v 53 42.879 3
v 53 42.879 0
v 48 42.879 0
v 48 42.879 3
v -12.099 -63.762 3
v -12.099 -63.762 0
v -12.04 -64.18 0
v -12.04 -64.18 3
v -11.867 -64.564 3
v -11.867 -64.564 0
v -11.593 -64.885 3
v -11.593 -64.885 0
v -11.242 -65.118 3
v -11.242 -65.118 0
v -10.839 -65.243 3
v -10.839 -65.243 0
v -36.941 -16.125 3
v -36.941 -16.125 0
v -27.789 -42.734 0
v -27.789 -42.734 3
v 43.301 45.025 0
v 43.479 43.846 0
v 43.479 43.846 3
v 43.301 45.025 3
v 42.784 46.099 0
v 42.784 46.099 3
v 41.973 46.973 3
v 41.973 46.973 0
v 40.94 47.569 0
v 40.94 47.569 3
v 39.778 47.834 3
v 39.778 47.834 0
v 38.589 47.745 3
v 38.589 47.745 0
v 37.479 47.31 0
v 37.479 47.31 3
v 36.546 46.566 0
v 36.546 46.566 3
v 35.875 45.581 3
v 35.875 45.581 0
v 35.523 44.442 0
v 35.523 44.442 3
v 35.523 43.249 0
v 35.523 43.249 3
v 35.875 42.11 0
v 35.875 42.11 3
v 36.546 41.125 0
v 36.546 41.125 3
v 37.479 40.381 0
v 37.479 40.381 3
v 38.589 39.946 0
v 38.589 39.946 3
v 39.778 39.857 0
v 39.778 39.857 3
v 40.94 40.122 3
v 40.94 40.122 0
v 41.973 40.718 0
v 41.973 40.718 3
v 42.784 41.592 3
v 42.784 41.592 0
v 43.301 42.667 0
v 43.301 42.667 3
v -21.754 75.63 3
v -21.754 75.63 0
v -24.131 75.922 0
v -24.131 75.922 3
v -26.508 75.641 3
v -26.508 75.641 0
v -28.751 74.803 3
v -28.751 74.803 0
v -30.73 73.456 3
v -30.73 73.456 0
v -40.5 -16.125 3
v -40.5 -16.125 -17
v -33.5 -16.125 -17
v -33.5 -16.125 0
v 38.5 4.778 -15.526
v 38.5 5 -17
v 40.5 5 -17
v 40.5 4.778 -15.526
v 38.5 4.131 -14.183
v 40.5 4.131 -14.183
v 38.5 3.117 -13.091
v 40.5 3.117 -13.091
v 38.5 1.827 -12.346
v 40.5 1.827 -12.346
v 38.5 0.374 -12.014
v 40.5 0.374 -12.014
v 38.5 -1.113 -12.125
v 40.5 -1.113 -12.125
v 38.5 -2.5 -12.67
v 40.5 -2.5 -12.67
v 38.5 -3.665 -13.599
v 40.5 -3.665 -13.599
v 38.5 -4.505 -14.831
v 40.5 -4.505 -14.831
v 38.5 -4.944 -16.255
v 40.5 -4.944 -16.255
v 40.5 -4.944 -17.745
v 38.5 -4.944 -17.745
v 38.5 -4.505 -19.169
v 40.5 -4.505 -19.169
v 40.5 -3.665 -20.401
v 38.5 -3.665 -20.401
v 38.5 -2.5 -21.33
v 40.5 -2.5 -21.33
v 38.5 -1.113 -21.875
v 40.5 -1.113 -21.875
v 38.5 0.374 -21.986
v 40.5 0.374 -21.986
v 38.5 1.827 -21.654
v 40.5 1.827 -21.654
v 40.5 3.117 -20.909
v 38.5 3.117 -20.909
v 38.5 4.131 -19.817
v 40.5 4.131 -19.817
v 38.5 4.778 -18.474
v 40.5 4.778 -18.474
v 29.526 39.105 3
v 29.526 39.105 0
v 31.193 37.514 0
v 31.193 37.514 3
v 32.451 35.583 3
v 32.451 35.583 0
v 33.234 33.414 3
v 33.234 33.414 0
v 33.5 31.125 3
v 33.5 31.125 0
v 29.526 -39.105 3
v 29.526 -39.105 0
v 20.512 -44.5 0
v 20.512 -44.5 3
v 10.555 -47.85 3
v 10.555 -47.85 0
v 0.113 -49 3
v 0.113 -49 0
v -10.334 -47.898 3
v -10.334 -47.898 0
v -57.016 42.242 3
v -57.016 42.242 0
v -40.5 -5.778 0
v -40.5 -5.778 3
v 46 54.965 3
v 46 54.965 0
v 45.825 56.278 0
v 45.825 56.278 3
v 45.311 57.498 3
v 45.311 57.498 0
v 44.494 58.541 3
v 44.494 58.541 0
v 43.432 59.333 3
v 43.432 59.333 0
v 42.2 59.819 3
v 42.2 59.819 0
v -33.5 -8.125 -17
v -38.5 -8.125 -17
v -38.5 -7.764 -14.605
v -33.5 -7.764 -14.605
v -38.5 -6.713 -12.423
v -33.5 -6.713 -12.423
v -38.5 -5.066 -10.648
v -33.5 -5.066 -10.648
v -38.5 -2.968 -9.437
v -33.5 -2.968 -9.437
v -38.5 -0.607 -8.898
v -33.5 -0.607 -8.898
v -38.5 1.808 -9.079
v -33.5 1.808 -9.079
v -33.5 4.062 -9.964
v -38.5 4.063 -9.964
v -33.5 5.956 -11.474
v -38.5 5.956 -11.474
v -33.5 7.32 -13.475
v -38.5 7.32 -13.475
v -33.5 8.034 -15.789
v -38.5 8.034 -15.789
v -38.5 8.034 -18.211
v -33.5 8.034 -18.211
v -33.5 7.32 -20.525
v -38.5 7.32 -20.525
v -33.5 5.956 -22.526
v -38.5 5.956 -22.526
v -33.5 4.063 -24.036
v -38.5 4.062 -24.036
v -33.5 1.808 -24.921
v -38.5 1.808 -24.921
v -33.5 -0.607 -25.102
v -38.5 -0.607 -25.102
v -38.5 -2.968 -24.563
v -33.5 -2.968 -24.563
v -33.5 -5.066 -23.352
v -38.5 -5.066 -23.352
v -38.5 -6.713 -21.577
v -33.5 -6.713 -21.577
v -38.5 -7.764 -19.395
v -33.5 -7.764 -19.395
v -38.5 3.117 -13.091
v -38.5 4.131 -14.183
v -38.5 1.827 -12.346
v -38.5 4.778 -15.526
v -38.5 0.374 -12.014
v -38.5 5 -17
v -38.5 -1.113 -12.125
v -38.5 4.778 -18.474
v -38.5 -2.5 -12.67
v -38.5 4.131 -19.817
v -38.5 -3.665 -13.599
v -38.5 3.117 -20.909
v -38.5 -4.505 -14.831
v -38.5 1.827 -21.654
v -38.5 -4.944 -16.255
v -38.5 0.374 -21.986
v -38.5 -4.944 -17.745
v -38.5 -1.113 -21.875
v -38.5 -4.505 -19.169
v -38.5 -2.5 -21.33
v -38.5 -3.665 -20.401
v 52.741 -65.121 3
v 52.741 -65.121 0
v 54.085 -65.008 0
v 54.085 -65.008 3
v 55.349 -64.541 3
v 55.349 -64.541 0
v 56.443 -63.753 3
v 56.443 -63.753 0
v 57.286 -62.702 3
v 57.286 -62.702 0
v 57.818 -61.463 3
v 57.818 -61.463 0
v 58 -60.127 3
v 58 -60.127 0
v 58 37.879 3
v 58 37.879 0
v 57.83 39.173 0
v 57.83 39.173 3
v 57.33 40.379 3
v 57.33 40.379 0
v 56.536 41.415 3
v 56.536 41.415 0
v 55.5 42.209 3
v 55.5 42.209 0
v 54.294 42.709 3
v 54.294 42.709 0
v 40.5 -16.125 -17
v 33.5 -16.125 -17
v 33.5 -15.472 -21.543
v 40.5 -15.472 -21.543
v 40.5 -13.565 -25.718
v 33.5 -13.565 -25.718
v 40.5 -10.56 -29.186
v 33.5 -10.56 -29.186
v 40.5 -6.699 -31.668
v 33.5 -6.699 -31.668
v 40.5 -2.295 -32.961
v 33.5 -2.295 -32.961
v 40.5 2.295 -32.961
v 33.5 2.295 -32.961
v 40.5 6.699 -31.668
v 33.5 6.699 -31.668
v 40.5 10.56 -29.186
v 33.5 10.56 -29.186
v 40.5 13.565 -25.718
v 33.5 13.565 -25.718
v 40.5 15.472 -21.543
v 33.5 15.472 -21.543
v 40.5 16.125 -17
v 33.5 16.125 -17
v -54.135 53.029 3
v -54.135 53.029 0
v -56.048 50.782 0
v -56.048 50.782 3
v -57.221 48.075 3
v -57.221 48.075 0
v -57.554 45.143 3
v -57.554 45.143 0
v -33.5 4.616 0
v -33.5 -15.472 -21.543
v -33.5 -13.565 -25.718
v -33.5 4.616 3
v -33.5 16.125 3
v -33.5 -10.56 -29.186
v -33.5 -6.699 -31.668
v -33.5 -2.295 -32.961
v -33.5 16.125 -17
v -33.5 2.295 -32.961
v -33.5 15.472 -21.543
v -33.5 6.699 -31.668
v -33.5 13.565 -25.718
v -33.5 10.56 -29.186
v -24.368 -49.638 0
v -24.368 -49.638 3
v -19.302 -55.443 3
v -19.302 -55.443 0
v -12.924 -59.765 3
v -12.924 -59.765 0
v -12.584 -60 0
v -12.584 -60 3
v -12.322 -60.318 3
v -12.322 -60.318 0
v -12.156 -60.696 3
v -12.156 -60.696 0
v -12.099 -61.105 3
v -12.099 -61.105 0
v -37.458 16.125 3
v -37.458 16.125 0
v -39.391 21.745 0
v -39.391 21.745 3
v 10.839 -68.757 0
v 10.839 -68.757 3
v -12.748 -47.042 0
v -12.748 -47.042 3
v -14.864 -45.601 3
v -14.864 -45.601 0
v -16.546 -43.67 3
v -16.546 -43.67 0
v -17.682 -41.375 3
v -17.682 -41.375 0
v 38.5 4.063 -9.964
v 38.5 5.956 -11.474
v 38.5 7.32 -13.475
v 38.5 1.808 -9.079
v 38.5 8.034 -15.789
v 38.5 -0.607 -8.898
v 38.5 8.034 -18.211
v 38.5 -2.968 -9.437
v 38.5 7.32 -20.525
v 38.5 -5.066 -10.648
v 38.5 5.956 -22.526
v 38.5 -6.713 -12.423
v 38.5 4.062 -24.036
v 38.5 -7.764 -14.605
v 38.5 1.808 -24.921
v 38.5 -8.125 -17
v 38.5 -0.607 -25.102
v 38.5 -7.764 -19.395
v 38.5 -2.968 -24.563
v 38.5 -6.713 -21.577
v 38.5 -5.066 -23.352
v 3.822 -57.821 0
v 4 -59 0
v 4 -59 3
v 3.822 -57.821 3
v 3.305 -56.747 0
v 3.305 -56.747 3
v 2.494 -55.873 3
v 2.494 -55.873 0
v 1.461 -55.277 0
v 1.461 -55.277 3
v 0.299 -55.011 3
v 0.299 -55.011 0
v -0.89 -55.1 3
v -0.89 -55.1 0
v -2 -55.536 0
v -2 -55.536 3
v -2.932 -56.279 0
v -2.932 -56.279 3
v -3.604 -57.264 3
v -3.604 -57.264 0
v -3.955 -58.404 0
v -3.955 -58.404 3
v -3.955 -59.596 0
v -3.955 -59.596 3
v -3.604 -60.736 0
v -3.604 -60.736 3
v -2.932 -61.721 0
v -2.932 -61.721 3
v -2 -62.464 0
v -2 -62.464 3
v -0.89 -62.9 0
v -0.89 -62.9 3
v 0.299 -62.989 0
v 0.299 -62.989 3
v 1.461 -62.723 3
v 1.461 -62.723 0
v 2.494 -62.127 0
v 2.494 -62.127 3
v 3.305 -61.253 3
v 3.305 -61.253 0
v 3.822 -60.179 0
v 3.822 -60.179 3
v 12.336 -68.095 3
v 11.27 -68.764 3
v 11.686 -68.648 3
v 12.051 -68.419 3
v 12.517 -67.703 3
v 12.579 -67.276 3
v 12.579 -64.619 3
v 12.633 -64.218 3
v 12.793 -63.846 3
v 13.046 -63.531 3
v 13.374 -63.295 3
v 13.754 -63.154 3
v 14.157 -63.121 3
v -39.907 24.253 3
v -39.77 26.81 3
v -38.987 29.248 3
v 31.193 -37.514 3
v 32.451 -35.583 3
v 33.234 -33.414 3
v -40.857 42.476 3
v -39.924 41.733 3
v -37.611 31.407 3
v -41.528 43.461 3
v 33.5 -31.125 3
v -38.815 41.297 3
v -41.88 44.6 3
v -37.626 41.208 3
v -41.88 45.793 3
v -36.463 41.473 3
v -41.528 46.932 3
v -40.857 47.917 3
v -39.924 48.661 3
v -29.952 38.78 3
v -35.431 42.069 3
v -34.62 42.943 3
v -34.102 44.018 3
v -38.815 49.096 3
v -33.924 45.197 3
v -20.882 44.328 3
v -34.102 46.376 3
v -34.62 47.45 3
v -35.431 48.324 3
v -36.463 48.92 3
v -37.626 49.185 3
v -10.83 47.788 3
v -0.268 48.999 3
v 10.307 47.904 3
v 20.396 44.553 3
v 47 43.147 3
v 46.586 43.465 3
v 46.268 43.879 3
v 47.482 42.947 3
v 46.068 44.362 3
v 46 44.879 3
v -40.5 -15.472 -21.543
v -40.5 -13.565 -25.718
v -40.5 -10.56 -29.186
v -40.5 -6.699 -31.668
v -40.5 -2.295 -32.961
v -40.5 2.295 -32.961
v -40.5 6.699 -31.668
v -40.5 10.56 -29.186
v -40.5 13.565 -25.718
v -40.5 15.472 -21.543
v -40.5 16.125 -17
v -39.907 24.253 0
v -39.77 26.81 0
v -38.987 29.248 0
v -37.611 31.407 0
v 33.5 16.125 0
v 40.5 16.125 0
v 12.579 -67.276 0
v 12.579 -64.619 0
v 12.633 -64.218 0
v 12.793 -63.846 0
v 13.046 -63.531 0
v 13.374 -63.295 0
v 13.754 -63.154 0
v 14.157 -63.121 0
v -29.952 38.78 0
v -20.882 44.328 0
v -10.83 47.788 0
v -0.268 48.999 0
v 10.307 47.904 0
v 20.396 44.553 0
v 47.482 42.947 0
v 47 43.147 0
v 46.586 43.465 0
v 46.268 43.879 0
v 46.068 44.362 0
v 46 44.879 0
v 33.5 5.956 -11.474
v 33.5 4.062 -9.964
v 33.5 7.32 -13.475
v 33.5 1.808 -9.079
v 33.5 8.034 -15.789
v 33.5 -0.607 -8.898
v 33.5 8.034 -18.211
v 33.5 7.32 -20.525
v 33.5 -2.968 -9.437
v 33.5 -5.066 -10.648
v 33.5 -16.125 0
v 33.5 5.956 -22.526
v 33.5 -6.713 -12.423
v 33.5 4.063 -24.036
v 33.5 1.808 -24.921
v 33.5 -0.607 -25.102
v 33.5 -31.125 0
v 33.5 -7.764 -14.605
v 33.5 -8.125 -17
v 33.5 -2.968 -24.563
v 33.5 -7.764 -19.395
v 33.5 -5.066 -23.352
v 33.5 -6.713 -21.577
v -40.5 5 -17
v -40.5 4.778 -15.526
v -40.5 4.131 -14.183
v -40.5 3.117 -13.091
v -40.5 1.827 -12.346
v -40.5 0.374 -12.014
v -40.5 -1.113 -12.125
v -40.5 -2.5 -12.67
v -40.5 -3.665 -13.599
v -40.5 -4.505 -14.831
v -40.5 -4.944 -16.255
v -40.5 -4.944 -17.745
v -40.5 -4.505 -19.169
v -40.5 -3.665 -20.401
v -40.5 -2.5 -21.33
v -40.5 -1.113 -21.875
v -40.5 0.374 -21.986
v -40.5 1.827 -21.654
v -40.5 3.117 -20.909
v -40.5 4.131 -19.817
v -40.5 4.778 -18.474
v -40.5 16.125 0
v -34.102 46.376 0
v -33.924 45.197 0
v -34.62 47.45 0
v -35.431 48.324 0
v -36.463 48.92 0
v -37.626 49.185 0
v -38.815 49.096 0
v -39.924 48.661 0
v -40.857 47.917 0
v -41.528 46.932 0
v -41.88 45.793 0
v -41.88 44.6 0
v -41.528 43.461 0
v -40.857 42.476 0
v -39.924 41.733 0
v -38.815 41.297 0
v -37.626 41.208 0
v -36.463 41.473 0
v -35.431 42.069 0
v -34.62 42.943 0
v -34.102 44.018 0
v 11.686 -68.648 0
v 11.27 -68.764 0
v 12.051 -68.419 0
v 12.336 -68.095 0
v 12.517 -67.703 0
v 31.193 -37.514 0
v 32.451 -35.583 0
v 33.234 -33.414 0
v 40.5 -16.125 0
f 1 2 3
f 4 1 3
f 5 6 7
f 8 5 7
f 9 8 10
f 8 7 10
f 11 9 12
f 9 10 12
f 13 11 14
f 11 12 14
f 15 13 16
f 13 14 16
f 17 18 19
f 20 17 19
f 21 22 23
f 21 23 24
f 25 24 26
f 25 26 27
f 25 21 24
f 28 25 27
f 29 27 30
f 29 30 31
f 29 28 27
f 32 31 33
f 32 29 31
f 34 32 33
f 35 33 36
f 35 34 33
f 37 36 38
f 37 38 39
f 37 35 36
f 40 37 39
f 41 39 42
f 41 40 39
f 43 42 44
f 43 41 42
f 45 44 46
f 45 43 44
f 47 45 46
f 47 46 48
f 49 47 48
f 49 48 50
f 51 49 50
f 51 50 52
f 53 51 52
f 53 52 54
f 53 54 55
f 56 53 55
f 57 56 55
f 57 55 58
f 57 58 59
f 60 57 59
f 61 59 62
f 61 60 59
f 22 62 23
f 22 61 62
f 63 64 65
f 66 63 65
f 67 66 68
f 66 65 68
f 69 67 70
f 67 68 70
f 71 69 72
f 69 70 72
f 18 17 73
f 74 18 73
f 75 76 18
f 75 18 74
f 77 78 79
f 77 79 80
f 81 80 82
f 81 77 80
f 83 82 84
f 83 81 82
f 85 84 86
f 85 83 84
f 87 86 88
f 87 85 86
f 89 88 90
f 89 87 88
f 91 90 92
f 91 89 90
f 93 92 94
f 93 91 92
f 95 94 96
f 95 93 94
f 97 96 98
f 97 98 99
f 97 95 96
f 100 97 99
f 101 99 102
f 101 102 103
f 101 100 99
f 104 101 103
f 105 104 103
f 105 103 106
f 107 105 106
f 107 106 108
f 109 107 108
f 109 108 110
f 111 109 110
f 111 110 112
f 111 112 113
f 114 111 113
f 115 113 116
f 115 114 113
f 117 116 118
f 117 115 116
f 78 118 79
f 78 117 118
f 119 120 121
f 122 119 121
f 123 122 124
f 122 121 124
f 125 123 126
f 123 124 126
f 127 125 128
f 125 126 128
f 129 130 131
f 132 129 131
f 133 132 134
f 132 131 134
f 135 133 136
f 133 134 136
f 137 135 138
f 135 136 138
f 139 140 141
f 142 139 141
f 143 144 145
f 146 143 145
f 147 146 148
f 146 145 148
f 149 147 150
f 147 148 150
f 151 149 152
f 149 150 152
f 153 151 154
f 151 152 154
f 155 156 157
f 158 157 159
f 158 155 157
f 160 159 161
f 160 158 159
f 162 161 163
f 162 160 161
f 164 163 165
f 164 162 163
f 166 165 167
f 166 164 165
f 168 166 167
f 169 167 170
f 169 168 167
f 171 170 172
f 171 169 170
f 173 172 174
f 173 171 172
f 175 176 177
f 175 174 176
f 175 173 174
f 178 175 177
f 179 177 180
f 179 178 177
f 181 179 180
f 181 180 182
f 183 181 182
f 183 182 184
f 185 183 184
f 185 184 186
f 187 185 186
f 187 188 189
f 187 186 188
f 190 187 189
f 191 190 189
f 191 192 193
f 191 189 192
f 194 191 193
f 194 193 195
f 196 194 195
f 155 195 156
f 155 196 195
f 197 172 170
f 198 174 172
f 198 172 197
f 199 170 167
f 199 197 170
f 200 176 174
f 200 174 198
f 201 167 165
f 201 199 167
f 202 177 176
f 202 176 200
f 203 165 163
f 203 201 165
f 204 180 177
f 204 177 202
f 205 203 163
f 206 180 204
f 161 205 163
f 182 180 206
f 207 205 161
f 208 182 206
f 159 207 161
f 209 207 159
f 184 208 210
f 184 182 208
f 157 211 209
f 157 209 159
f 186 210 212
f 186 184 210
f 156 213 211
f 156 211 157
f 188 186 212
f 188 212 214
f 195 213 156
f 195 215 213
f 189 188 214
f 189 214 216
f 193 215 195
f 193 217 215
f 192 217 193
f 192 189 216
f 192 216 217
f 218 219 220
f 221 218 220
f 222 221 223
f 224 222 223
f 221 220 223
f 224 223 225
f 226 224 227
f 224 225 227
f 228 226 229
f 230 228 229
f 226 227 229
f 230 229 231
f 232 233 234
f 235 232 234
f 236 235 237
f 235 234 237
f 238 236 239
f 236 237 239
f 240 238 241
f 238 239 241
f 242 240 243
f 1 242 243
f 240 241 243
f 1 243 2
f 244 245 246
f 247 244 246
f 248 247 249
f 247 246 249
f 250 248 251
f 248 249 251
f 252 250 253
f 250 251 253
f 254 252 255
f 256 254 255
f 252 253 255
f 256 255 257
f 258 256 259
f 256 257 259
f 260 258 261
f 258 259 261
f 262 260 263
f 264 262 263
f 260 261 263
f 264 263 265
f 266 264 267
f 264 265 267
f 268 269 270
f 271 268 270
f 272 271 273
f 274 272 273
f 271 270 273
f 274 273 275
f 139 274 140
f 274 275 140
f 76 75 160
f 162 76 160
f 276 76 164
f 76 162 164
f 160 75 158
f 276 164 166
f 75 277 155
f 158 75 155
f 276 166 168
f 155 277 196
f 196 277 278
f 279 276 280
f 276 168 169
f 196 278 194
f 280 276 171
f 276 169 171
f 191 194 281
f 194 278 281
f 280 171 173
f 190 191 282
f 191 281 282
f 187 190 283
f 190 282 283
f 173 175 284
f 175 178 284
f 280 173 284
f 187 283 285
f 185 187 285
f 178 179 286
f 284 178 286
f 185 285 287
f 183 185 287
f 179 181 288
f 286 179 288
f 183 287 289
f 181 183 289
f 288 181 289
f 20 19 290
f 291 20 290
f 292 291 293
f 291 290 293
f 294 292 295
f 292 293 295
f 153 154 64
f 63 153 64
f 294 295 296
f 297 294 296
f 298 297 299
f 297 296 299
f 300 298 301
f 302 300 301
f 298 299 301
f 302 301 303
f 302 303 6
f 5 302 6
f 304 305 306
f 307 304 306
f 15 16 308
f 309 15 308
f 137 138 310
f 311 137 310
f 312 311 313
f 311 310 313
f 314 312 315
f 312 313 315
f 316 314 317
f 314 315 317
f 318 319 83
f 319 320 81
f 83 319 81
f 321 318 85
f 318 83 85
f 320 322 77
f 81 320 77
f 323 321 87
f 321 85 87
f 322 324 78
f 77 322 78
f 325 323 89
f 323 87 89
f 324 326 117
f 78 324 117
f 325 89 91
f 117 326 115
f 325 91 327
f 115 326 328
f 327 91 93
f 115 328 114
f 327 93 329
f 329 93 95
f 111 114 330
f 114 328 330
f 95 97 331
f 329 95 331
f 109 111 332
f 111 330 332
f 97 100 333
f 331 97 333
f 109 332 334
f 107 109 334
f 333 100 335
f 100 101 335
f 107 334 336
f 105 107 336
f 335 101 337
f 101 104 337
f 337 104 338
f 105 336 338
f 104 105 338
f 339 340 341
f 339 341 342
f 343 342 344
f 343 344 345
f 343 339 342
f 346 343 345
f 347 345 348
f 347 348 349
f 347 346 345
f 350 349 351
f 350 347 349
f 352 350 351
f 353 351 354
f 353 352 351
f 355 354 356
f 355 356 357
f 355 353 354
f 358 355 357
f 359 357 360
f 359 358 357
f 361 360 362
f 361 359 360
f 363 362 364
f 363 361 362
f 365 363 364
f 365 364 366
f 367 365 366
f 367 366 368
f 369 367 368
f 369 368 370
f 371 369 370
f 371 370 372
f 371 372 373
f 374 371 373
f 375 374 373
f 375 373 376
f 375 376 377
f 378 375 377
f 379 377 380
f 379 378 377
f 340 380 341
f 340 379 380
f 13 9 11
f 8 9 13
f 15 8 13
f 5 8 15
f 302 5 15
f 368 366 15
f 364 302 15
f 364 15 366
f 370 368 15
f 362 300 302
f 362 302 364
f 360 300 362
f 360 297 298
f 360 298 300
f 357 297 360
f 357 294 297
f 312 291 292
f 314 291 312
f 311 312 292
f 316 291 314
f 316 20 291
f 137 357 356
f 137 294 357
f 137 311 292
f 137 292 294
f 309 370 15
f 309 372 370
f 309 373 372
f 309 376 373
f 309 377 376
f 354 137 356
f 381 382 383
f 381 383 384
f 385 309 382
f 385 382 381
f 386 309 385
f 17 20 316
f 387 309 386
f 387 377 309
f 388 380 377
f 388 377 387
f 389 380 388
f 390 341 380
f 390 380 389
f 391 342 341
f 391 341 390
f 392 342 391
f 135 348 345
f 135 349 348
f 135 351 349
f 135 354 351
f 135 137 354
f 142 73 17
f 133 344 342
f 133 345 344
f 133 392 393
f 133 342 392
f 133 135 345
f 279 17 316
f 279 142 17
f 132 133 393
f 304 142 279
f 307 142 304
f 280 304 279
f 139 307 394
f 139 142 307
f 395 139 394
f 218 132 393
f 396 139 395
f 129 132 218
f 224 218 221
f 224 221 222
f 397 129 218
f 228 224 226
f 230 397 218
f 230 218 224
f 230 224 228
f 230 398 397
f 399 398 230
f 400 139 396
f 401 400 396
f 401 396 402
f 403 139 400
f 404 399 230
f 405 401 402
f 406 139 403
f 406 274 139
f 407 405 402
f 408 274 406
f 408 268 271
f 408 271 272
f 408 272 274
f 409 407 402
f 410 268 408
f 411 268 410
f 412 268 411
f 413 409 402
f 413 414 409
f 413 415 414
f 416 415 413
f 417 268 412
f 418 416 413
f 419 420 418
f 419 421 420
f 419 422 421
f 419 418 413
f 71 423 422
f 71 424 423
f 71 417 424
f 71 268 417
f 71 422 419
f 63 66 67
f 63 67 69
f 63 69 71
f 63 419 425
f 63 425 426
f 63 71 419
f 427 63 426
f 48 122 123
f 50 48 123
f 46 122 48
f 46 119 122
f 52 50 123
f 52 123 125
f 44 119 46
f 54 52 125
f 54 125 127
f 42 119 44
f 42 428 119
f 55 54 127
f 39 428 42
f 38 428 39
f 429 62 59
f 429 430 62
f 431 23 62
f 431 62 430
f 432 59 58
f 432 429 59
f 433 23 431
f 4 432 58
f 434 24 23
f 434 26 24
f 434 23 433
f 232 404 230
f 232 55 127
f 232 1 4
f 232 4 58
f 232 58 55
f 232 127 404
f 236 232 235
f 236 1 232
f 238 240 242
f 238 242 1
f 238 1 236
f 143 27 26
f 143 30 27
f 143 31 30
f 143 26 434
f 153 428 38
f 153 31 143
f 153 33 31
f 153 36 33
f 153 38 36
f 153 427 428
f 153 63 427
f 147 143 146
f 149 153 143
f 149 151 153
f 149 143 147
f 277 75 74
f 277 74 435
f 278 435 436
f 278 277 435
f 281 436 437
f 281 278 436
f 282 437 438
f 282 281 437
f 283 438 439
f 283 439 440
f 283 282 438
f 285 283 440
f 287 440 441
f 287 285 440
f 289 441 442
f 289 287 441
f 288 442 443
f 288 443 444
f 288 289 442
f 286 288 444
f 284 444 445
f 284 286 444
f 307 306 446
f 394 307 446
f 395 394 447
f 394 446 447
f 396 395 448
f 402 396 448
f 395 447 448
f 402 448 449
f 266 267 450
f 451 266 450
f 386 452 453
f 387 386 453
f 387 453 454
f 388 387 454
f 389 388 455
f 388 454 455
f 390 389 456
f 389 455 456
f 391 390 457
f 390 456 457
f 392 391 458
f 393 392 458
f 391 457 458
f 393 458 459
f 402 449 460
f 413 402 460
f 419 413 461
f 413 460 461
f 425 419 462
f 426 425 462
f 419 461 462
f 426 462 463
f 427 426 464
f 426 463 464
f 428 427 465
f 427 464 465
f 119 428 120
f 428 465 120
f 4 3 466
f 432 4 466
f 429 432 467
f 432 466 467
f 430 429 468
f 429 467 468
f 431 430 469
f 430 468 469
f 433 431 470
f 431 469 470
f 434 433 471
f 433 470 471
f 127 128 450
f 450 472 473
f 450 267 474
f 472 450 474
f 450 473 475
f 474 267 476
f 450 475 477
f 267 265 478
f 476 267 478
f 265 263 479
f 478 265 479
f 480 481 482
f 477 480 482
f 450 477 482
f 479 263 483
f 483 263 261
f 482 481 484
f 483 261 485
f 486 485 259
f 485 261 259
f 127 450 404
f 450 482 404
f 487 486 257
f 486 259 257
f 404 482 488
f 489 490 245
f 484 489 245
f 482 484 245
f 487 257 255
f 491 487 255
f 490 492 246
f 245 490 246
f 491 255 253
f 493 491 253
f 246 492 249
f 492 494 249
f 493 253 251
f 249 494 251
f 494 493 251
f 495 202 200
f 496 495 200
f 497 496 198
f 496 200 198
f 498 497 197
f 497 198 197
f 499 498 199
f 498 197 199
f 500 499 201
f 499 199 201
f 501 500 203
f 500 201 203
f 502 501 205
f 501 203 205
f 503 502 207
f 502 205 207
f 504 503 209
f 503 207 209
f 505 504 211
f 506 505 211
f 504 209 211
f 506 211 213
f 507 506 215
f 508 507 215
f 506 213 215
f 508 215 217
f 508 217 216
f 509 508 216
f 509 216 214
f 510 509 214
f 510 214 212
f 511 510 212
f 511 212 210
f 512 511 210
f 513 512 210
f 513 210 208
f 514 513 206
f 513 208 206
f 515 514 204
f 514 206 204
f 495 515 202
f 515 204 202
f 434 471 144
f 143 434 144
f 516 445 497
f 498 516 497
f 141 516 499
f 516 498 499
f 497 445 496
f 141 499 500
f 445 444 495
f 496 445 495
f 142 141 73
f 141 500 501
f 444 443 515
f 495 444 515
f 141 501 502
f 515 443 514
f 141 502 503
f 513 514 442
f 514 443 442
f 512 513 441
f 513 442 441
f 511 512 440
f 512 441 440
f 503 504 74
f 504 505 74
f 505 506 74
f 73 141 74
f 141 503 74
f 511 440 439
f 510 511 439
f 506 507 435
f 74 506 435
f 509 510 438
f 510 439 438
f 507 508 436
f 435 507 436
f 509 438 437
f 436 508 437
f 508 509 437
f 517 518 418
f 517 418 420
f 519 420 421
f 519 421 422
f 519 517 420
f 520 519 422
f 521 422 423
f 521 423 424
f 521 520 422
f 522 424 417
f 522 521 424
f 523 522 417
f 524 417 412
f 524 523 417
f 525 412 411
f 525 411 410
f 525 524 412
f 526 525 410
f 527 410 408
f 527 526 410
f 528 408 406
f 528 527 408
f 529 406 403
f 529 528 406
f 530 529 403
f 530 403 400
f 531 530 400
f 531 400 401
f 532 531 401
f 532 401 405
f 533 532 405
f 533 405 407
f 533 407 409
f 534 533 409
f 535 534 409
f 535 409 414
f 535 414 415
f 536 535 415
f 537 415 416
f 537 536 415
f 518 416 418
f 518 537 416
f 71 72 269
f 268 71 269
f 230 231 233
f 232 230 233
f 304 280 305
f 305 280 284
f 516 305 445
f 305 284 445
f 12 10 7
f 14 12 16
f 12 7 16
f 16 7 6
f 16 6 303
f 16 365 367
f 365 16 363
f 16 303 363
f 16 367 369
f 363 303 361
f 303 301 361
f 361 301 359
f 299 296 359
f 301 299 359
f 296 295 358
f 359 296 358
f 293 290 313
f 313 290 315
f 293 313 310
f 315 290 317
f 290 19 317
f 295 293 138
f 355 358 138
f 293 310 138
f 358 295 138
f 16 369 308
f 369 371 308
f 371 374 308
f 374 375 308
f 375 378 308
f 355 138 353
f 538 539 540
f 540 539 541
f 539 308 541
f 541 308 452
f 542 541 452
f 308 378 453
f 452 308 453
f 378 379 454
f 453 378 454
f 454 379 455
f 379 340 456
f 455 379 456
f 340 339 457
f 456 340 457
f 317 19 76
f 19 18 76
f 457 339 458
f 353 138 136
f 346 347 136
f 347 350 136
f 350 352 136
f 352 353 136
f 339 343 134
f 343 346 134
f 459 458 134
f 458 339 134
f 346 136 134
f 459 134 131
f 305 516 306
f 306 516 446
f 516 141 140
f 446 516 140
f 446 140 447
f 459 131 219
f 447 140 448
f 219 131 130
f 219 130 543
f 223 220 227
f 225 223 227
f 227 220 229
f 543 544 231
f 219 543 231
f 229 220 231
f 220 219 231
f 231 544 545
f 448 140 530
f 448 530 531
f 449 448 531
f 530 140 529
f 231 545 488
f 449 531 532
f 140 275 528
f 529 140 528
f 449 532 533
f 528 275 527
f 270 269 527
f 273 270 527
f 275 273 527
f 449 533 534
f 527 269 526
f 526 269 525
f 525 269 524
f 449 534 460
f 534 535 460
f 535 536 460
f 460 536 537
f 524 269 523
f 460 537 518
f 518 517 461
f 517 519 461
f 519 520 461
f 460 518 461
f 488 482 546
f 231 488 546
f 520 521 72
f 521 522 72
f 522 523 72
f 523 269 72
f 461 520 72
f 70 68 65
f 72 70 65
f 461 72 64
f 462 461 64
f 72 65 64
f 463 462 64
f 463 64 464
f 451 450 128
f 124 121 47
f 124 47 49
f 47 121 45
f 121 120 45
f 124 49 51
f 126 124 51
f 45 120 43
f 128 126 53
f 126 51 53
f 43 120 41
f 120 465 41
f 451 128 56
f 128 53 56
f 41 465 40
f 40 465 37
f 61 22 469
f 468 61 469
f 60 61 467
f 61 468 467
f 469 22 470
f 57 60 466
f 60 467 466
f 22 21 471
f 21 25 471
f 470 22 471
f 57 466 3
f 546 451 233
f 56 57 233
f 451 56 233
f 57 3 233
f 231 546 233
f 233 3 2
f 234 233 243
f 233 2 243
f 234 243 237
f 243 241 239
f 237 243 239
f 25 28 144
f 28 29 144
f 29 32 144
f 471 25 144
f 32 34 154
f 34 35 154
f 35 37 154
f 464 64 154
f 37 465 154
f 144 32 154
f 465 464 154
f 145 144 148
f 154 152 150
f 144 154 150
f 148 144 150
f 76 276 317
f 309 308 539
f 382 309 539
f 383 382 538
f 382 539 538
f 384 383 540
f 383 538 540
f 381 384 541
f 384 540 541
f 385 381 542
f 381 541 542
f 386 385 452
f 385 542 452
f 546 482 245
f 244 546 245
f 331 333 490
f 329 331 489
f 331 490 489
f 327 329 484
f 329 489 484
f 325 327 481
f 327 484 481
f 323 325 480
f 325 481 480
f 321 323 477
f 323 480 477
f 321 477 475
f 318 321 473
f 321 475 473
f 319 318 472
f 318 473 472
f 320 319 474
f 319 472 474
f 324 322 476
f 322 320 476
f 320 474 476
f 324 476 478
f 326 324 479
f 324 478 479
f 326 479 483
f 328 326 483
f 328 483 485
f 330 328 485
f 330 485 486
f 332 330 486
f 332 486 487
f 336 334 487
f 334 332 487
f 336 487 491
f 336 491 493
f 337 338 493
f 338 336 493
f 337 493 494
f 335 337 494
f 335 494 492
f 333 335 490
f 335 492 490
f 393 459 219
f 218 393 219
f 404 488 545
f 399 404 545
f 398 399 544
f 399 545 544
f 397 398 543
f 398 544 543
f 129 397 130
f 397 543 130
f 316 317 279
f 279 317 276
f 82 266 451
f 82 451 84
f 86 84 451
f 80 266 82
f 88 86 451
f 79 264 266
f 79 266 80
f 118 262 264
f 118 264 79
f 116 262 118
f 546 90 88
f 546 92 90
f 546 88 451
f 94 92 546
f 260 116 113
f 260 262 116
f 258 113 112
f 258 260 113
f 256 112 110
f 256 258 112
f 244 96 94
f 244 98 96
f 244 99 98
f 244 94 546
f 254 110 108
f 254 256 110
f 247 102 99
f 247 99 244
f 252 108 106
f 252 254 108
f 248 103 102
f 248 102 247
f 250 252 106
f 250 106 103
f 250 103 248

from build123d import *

# Parameters (mm, degrees)
SKETCH1_R                               = 4
BUMPER_LINK_DEPTH                       = 3
SKETCH3_R                               = 8.125
BEARING_BLOCK_DEPTH                     = 7
BEARING_START                           = -2
SKETCH4_R                               = 8.125
SKETCH4_R_2                             = 5
BEARING_END_FLANGE_DEPTH                = 2
MIRRORED_BEARING_BLOCK_CONNECTION_DEPTH = 3


with BuildPart() as part:
    # Sketch1 → Bumper link (new body)
    with BuildSketch(Plane.XY):
        with BuildLine():
            Line((-12.098962679, -61.104930733), (-12.098962679, -63.762456748))
            ThreePointArc((-12.098962679, -63.762456748), (-11.741328645, -64.734567853), (-10.838962679, -65.24313227))
            Line((-10.838962679, -65.24313227), (10.838962679, -68.75686773))
            ThreePointArc((10.838962679, -68.75686773), (12.051073784, -68.418558175), (12.578962679, -67.276192209))
            Line((12.578962679, -67.276192209), (12.578962679, -64.618666193))
            ThreePointArc((12.578962679, -64.618666193), (13.046119656, -63.530900001), (14.156609733, -63.12067723))
            Line((14.156609733, -63.12067723), (52.741176488, -65.12067723))
            ThreePointArc((52.741176488, -65.12067723), (56.442810076, -63.753267994), (58, -60.127380685))
            Line((58, -60.127380685), (58, 37.87932277))
            ThreePointArc((58, 37.87932277), (56.535533906, 41.414856676), (53, 42.87932277))
            Line((53, 42.87932277), (48, 42.87932277))
            ThreePointArc((48, 42.87932277), (46.585786438, 43.465109208), (46, 44.87932277))
            Line((46, 44.87932277), (46, 54.964915964))
            ThreePointArc((46, 54.964915964), (44.937003937, 58.047122965), (42.2, 59.818780404))
            Line((42.2, 59.818780404), (-21.754442807, 75.629961849))
            ThreePointArc((-21.754442807, 75.629961849), (-26.508147155, 75.641290323), (-30.729965317, 73.456322411))
            Line((-30.729965317, 73.456322411), (-54.135467109, 53.028717314))
            ThreePointArc((-54.135467109, 53.028717314), (-57.221318402, 48.074910074), (-57.01624643, 42.242189451))
            Line((-57.01624643, 42.242189451), (-27.78932032, -42.733634568))
            ThreePointArc((-27.78932032, -42.733634568), (-22.022249502, -52.703383692), (-12.923793734, -59.765473046))
            ThreePointArc((-12.923793734, -59.765473046), (-12.321709099, -60.318404642), (-12.098962679, -61.104930733))
        make_face()
        with Locations((0, -59)):
            Circle(SKETCH1_R, mode=Mode.SUBTRACT)
        with Locations((-37.924468972, 45.196622144)):
            Circle(SKETCH1_R, mode=Mode.SUBTRACT)
        with Locations((39.478705775, 43.845544703)):
            Circle(SKETCH1_R, mode=Mode.SUBTRACT)
        with BuildLine():
            Line((33.5, 31.124748995), (33.5, -31.124748995))
            ThreePointArc((33.5, -31.124748995), (32.451435925, -35.582528136), (29.525641026, -39.105453865))
            ThreePointArc((29.525641026, -39.105453865), (10.554762126, -47.849733505), (-10.33433455, -47.897823848))
            ThreePointArc((-10.33433455, -47.897823848), (-14.864224576, -45.601026517), (-17.681588514, -41.375196178))
            Line((-17.681588514, -41.375196178), (-39.391489139, 21.745252689))
            ThreePointArc((-39.391489139, 21.745252689), (-39.769582846, 26.810055426), (-37.610876362, 31.407355497))
            ThreePointArc((-37.610876362, 31.407355497), (-5.581929526, 48.681023641), (29.525641026, 39.105453865))
            ThreePointArc((29.525641026, 39.105453865), (32.451435925, 35.582528136), (33.5, 31.124748995))
        make_face(mode=Mode.SUBTRACT)
    extrude(amount=BUMPER_LINK_DEPTH)

    # Sketch3 → Bearing block (add)
    with BuildSketch(Plane.ZY.offset(-33.5)):
        with BuildLine():
            Line((-17, 16.125), (0, 16.125))
            Line((0, 16.125), (0, -16.125))
            Line((0, -16.125), (-17, -16.125))
            ThreePointArc((-17, -16.125), (-33.125, 0), (-17, 16.125))
        make_face()
        with Locations(Location((-17, 0, 0), (0, 0, 270))):
            Circle(SKETCH3_R, mode=Mode.SUBTRACT)
    bearing_block = extrude(amount=-BEARING_BLOCK_DEPTH)

    # Sketch4 → Bearing end flange (add)
    with BuildSketch(Plane(origin=(40.5, 0, 0), x_dir=(0, 0, -1), z_dir=(1, 0, 0)).offset(BEARING_START)):
        with Locations(Location((17, 0, 0), (0, 0, 270))):
            Circle(SKETCH4_R)
        with Locations(Location((17, 0, 0), (0, 0, 90))):
            Circle(SKETCH4_R_2, mode=Mode.SUBTRACT)
    bearing_end_flange = extrude(amount=BEARING_END_FLANGE_DEPTH)

    # Mirror1: Bearing block, Bearing end flange across plane
    add(bearing_block.mirror(Plane(origin=(0, 0, 0), x_dir=(0, 0, 1), z_dir=(1, 0, 0))))
    add(bearing_end_flange.mirror(Plane(origin=(0, 0, 0), x_dir=(0, 0, 1), z_dir=(1, 0, 0))))

    # Sketch6 → Mirrored bearing block connection (add)
    with BuildSketch(Plane.XY):
        Polygon((-37.458436863, 16.125), (-33.5, 4.616043054), (-33.5, 16.125), align=None)
        Polygon((-40.5, -16.125), (-36.941200933, -16.125), (-40.5, -5.777969932), align=None)
    extrude(amount=MIRRORED_BEARING_BLOCK_CONNECTION_DEPTH)


solid = part.part
